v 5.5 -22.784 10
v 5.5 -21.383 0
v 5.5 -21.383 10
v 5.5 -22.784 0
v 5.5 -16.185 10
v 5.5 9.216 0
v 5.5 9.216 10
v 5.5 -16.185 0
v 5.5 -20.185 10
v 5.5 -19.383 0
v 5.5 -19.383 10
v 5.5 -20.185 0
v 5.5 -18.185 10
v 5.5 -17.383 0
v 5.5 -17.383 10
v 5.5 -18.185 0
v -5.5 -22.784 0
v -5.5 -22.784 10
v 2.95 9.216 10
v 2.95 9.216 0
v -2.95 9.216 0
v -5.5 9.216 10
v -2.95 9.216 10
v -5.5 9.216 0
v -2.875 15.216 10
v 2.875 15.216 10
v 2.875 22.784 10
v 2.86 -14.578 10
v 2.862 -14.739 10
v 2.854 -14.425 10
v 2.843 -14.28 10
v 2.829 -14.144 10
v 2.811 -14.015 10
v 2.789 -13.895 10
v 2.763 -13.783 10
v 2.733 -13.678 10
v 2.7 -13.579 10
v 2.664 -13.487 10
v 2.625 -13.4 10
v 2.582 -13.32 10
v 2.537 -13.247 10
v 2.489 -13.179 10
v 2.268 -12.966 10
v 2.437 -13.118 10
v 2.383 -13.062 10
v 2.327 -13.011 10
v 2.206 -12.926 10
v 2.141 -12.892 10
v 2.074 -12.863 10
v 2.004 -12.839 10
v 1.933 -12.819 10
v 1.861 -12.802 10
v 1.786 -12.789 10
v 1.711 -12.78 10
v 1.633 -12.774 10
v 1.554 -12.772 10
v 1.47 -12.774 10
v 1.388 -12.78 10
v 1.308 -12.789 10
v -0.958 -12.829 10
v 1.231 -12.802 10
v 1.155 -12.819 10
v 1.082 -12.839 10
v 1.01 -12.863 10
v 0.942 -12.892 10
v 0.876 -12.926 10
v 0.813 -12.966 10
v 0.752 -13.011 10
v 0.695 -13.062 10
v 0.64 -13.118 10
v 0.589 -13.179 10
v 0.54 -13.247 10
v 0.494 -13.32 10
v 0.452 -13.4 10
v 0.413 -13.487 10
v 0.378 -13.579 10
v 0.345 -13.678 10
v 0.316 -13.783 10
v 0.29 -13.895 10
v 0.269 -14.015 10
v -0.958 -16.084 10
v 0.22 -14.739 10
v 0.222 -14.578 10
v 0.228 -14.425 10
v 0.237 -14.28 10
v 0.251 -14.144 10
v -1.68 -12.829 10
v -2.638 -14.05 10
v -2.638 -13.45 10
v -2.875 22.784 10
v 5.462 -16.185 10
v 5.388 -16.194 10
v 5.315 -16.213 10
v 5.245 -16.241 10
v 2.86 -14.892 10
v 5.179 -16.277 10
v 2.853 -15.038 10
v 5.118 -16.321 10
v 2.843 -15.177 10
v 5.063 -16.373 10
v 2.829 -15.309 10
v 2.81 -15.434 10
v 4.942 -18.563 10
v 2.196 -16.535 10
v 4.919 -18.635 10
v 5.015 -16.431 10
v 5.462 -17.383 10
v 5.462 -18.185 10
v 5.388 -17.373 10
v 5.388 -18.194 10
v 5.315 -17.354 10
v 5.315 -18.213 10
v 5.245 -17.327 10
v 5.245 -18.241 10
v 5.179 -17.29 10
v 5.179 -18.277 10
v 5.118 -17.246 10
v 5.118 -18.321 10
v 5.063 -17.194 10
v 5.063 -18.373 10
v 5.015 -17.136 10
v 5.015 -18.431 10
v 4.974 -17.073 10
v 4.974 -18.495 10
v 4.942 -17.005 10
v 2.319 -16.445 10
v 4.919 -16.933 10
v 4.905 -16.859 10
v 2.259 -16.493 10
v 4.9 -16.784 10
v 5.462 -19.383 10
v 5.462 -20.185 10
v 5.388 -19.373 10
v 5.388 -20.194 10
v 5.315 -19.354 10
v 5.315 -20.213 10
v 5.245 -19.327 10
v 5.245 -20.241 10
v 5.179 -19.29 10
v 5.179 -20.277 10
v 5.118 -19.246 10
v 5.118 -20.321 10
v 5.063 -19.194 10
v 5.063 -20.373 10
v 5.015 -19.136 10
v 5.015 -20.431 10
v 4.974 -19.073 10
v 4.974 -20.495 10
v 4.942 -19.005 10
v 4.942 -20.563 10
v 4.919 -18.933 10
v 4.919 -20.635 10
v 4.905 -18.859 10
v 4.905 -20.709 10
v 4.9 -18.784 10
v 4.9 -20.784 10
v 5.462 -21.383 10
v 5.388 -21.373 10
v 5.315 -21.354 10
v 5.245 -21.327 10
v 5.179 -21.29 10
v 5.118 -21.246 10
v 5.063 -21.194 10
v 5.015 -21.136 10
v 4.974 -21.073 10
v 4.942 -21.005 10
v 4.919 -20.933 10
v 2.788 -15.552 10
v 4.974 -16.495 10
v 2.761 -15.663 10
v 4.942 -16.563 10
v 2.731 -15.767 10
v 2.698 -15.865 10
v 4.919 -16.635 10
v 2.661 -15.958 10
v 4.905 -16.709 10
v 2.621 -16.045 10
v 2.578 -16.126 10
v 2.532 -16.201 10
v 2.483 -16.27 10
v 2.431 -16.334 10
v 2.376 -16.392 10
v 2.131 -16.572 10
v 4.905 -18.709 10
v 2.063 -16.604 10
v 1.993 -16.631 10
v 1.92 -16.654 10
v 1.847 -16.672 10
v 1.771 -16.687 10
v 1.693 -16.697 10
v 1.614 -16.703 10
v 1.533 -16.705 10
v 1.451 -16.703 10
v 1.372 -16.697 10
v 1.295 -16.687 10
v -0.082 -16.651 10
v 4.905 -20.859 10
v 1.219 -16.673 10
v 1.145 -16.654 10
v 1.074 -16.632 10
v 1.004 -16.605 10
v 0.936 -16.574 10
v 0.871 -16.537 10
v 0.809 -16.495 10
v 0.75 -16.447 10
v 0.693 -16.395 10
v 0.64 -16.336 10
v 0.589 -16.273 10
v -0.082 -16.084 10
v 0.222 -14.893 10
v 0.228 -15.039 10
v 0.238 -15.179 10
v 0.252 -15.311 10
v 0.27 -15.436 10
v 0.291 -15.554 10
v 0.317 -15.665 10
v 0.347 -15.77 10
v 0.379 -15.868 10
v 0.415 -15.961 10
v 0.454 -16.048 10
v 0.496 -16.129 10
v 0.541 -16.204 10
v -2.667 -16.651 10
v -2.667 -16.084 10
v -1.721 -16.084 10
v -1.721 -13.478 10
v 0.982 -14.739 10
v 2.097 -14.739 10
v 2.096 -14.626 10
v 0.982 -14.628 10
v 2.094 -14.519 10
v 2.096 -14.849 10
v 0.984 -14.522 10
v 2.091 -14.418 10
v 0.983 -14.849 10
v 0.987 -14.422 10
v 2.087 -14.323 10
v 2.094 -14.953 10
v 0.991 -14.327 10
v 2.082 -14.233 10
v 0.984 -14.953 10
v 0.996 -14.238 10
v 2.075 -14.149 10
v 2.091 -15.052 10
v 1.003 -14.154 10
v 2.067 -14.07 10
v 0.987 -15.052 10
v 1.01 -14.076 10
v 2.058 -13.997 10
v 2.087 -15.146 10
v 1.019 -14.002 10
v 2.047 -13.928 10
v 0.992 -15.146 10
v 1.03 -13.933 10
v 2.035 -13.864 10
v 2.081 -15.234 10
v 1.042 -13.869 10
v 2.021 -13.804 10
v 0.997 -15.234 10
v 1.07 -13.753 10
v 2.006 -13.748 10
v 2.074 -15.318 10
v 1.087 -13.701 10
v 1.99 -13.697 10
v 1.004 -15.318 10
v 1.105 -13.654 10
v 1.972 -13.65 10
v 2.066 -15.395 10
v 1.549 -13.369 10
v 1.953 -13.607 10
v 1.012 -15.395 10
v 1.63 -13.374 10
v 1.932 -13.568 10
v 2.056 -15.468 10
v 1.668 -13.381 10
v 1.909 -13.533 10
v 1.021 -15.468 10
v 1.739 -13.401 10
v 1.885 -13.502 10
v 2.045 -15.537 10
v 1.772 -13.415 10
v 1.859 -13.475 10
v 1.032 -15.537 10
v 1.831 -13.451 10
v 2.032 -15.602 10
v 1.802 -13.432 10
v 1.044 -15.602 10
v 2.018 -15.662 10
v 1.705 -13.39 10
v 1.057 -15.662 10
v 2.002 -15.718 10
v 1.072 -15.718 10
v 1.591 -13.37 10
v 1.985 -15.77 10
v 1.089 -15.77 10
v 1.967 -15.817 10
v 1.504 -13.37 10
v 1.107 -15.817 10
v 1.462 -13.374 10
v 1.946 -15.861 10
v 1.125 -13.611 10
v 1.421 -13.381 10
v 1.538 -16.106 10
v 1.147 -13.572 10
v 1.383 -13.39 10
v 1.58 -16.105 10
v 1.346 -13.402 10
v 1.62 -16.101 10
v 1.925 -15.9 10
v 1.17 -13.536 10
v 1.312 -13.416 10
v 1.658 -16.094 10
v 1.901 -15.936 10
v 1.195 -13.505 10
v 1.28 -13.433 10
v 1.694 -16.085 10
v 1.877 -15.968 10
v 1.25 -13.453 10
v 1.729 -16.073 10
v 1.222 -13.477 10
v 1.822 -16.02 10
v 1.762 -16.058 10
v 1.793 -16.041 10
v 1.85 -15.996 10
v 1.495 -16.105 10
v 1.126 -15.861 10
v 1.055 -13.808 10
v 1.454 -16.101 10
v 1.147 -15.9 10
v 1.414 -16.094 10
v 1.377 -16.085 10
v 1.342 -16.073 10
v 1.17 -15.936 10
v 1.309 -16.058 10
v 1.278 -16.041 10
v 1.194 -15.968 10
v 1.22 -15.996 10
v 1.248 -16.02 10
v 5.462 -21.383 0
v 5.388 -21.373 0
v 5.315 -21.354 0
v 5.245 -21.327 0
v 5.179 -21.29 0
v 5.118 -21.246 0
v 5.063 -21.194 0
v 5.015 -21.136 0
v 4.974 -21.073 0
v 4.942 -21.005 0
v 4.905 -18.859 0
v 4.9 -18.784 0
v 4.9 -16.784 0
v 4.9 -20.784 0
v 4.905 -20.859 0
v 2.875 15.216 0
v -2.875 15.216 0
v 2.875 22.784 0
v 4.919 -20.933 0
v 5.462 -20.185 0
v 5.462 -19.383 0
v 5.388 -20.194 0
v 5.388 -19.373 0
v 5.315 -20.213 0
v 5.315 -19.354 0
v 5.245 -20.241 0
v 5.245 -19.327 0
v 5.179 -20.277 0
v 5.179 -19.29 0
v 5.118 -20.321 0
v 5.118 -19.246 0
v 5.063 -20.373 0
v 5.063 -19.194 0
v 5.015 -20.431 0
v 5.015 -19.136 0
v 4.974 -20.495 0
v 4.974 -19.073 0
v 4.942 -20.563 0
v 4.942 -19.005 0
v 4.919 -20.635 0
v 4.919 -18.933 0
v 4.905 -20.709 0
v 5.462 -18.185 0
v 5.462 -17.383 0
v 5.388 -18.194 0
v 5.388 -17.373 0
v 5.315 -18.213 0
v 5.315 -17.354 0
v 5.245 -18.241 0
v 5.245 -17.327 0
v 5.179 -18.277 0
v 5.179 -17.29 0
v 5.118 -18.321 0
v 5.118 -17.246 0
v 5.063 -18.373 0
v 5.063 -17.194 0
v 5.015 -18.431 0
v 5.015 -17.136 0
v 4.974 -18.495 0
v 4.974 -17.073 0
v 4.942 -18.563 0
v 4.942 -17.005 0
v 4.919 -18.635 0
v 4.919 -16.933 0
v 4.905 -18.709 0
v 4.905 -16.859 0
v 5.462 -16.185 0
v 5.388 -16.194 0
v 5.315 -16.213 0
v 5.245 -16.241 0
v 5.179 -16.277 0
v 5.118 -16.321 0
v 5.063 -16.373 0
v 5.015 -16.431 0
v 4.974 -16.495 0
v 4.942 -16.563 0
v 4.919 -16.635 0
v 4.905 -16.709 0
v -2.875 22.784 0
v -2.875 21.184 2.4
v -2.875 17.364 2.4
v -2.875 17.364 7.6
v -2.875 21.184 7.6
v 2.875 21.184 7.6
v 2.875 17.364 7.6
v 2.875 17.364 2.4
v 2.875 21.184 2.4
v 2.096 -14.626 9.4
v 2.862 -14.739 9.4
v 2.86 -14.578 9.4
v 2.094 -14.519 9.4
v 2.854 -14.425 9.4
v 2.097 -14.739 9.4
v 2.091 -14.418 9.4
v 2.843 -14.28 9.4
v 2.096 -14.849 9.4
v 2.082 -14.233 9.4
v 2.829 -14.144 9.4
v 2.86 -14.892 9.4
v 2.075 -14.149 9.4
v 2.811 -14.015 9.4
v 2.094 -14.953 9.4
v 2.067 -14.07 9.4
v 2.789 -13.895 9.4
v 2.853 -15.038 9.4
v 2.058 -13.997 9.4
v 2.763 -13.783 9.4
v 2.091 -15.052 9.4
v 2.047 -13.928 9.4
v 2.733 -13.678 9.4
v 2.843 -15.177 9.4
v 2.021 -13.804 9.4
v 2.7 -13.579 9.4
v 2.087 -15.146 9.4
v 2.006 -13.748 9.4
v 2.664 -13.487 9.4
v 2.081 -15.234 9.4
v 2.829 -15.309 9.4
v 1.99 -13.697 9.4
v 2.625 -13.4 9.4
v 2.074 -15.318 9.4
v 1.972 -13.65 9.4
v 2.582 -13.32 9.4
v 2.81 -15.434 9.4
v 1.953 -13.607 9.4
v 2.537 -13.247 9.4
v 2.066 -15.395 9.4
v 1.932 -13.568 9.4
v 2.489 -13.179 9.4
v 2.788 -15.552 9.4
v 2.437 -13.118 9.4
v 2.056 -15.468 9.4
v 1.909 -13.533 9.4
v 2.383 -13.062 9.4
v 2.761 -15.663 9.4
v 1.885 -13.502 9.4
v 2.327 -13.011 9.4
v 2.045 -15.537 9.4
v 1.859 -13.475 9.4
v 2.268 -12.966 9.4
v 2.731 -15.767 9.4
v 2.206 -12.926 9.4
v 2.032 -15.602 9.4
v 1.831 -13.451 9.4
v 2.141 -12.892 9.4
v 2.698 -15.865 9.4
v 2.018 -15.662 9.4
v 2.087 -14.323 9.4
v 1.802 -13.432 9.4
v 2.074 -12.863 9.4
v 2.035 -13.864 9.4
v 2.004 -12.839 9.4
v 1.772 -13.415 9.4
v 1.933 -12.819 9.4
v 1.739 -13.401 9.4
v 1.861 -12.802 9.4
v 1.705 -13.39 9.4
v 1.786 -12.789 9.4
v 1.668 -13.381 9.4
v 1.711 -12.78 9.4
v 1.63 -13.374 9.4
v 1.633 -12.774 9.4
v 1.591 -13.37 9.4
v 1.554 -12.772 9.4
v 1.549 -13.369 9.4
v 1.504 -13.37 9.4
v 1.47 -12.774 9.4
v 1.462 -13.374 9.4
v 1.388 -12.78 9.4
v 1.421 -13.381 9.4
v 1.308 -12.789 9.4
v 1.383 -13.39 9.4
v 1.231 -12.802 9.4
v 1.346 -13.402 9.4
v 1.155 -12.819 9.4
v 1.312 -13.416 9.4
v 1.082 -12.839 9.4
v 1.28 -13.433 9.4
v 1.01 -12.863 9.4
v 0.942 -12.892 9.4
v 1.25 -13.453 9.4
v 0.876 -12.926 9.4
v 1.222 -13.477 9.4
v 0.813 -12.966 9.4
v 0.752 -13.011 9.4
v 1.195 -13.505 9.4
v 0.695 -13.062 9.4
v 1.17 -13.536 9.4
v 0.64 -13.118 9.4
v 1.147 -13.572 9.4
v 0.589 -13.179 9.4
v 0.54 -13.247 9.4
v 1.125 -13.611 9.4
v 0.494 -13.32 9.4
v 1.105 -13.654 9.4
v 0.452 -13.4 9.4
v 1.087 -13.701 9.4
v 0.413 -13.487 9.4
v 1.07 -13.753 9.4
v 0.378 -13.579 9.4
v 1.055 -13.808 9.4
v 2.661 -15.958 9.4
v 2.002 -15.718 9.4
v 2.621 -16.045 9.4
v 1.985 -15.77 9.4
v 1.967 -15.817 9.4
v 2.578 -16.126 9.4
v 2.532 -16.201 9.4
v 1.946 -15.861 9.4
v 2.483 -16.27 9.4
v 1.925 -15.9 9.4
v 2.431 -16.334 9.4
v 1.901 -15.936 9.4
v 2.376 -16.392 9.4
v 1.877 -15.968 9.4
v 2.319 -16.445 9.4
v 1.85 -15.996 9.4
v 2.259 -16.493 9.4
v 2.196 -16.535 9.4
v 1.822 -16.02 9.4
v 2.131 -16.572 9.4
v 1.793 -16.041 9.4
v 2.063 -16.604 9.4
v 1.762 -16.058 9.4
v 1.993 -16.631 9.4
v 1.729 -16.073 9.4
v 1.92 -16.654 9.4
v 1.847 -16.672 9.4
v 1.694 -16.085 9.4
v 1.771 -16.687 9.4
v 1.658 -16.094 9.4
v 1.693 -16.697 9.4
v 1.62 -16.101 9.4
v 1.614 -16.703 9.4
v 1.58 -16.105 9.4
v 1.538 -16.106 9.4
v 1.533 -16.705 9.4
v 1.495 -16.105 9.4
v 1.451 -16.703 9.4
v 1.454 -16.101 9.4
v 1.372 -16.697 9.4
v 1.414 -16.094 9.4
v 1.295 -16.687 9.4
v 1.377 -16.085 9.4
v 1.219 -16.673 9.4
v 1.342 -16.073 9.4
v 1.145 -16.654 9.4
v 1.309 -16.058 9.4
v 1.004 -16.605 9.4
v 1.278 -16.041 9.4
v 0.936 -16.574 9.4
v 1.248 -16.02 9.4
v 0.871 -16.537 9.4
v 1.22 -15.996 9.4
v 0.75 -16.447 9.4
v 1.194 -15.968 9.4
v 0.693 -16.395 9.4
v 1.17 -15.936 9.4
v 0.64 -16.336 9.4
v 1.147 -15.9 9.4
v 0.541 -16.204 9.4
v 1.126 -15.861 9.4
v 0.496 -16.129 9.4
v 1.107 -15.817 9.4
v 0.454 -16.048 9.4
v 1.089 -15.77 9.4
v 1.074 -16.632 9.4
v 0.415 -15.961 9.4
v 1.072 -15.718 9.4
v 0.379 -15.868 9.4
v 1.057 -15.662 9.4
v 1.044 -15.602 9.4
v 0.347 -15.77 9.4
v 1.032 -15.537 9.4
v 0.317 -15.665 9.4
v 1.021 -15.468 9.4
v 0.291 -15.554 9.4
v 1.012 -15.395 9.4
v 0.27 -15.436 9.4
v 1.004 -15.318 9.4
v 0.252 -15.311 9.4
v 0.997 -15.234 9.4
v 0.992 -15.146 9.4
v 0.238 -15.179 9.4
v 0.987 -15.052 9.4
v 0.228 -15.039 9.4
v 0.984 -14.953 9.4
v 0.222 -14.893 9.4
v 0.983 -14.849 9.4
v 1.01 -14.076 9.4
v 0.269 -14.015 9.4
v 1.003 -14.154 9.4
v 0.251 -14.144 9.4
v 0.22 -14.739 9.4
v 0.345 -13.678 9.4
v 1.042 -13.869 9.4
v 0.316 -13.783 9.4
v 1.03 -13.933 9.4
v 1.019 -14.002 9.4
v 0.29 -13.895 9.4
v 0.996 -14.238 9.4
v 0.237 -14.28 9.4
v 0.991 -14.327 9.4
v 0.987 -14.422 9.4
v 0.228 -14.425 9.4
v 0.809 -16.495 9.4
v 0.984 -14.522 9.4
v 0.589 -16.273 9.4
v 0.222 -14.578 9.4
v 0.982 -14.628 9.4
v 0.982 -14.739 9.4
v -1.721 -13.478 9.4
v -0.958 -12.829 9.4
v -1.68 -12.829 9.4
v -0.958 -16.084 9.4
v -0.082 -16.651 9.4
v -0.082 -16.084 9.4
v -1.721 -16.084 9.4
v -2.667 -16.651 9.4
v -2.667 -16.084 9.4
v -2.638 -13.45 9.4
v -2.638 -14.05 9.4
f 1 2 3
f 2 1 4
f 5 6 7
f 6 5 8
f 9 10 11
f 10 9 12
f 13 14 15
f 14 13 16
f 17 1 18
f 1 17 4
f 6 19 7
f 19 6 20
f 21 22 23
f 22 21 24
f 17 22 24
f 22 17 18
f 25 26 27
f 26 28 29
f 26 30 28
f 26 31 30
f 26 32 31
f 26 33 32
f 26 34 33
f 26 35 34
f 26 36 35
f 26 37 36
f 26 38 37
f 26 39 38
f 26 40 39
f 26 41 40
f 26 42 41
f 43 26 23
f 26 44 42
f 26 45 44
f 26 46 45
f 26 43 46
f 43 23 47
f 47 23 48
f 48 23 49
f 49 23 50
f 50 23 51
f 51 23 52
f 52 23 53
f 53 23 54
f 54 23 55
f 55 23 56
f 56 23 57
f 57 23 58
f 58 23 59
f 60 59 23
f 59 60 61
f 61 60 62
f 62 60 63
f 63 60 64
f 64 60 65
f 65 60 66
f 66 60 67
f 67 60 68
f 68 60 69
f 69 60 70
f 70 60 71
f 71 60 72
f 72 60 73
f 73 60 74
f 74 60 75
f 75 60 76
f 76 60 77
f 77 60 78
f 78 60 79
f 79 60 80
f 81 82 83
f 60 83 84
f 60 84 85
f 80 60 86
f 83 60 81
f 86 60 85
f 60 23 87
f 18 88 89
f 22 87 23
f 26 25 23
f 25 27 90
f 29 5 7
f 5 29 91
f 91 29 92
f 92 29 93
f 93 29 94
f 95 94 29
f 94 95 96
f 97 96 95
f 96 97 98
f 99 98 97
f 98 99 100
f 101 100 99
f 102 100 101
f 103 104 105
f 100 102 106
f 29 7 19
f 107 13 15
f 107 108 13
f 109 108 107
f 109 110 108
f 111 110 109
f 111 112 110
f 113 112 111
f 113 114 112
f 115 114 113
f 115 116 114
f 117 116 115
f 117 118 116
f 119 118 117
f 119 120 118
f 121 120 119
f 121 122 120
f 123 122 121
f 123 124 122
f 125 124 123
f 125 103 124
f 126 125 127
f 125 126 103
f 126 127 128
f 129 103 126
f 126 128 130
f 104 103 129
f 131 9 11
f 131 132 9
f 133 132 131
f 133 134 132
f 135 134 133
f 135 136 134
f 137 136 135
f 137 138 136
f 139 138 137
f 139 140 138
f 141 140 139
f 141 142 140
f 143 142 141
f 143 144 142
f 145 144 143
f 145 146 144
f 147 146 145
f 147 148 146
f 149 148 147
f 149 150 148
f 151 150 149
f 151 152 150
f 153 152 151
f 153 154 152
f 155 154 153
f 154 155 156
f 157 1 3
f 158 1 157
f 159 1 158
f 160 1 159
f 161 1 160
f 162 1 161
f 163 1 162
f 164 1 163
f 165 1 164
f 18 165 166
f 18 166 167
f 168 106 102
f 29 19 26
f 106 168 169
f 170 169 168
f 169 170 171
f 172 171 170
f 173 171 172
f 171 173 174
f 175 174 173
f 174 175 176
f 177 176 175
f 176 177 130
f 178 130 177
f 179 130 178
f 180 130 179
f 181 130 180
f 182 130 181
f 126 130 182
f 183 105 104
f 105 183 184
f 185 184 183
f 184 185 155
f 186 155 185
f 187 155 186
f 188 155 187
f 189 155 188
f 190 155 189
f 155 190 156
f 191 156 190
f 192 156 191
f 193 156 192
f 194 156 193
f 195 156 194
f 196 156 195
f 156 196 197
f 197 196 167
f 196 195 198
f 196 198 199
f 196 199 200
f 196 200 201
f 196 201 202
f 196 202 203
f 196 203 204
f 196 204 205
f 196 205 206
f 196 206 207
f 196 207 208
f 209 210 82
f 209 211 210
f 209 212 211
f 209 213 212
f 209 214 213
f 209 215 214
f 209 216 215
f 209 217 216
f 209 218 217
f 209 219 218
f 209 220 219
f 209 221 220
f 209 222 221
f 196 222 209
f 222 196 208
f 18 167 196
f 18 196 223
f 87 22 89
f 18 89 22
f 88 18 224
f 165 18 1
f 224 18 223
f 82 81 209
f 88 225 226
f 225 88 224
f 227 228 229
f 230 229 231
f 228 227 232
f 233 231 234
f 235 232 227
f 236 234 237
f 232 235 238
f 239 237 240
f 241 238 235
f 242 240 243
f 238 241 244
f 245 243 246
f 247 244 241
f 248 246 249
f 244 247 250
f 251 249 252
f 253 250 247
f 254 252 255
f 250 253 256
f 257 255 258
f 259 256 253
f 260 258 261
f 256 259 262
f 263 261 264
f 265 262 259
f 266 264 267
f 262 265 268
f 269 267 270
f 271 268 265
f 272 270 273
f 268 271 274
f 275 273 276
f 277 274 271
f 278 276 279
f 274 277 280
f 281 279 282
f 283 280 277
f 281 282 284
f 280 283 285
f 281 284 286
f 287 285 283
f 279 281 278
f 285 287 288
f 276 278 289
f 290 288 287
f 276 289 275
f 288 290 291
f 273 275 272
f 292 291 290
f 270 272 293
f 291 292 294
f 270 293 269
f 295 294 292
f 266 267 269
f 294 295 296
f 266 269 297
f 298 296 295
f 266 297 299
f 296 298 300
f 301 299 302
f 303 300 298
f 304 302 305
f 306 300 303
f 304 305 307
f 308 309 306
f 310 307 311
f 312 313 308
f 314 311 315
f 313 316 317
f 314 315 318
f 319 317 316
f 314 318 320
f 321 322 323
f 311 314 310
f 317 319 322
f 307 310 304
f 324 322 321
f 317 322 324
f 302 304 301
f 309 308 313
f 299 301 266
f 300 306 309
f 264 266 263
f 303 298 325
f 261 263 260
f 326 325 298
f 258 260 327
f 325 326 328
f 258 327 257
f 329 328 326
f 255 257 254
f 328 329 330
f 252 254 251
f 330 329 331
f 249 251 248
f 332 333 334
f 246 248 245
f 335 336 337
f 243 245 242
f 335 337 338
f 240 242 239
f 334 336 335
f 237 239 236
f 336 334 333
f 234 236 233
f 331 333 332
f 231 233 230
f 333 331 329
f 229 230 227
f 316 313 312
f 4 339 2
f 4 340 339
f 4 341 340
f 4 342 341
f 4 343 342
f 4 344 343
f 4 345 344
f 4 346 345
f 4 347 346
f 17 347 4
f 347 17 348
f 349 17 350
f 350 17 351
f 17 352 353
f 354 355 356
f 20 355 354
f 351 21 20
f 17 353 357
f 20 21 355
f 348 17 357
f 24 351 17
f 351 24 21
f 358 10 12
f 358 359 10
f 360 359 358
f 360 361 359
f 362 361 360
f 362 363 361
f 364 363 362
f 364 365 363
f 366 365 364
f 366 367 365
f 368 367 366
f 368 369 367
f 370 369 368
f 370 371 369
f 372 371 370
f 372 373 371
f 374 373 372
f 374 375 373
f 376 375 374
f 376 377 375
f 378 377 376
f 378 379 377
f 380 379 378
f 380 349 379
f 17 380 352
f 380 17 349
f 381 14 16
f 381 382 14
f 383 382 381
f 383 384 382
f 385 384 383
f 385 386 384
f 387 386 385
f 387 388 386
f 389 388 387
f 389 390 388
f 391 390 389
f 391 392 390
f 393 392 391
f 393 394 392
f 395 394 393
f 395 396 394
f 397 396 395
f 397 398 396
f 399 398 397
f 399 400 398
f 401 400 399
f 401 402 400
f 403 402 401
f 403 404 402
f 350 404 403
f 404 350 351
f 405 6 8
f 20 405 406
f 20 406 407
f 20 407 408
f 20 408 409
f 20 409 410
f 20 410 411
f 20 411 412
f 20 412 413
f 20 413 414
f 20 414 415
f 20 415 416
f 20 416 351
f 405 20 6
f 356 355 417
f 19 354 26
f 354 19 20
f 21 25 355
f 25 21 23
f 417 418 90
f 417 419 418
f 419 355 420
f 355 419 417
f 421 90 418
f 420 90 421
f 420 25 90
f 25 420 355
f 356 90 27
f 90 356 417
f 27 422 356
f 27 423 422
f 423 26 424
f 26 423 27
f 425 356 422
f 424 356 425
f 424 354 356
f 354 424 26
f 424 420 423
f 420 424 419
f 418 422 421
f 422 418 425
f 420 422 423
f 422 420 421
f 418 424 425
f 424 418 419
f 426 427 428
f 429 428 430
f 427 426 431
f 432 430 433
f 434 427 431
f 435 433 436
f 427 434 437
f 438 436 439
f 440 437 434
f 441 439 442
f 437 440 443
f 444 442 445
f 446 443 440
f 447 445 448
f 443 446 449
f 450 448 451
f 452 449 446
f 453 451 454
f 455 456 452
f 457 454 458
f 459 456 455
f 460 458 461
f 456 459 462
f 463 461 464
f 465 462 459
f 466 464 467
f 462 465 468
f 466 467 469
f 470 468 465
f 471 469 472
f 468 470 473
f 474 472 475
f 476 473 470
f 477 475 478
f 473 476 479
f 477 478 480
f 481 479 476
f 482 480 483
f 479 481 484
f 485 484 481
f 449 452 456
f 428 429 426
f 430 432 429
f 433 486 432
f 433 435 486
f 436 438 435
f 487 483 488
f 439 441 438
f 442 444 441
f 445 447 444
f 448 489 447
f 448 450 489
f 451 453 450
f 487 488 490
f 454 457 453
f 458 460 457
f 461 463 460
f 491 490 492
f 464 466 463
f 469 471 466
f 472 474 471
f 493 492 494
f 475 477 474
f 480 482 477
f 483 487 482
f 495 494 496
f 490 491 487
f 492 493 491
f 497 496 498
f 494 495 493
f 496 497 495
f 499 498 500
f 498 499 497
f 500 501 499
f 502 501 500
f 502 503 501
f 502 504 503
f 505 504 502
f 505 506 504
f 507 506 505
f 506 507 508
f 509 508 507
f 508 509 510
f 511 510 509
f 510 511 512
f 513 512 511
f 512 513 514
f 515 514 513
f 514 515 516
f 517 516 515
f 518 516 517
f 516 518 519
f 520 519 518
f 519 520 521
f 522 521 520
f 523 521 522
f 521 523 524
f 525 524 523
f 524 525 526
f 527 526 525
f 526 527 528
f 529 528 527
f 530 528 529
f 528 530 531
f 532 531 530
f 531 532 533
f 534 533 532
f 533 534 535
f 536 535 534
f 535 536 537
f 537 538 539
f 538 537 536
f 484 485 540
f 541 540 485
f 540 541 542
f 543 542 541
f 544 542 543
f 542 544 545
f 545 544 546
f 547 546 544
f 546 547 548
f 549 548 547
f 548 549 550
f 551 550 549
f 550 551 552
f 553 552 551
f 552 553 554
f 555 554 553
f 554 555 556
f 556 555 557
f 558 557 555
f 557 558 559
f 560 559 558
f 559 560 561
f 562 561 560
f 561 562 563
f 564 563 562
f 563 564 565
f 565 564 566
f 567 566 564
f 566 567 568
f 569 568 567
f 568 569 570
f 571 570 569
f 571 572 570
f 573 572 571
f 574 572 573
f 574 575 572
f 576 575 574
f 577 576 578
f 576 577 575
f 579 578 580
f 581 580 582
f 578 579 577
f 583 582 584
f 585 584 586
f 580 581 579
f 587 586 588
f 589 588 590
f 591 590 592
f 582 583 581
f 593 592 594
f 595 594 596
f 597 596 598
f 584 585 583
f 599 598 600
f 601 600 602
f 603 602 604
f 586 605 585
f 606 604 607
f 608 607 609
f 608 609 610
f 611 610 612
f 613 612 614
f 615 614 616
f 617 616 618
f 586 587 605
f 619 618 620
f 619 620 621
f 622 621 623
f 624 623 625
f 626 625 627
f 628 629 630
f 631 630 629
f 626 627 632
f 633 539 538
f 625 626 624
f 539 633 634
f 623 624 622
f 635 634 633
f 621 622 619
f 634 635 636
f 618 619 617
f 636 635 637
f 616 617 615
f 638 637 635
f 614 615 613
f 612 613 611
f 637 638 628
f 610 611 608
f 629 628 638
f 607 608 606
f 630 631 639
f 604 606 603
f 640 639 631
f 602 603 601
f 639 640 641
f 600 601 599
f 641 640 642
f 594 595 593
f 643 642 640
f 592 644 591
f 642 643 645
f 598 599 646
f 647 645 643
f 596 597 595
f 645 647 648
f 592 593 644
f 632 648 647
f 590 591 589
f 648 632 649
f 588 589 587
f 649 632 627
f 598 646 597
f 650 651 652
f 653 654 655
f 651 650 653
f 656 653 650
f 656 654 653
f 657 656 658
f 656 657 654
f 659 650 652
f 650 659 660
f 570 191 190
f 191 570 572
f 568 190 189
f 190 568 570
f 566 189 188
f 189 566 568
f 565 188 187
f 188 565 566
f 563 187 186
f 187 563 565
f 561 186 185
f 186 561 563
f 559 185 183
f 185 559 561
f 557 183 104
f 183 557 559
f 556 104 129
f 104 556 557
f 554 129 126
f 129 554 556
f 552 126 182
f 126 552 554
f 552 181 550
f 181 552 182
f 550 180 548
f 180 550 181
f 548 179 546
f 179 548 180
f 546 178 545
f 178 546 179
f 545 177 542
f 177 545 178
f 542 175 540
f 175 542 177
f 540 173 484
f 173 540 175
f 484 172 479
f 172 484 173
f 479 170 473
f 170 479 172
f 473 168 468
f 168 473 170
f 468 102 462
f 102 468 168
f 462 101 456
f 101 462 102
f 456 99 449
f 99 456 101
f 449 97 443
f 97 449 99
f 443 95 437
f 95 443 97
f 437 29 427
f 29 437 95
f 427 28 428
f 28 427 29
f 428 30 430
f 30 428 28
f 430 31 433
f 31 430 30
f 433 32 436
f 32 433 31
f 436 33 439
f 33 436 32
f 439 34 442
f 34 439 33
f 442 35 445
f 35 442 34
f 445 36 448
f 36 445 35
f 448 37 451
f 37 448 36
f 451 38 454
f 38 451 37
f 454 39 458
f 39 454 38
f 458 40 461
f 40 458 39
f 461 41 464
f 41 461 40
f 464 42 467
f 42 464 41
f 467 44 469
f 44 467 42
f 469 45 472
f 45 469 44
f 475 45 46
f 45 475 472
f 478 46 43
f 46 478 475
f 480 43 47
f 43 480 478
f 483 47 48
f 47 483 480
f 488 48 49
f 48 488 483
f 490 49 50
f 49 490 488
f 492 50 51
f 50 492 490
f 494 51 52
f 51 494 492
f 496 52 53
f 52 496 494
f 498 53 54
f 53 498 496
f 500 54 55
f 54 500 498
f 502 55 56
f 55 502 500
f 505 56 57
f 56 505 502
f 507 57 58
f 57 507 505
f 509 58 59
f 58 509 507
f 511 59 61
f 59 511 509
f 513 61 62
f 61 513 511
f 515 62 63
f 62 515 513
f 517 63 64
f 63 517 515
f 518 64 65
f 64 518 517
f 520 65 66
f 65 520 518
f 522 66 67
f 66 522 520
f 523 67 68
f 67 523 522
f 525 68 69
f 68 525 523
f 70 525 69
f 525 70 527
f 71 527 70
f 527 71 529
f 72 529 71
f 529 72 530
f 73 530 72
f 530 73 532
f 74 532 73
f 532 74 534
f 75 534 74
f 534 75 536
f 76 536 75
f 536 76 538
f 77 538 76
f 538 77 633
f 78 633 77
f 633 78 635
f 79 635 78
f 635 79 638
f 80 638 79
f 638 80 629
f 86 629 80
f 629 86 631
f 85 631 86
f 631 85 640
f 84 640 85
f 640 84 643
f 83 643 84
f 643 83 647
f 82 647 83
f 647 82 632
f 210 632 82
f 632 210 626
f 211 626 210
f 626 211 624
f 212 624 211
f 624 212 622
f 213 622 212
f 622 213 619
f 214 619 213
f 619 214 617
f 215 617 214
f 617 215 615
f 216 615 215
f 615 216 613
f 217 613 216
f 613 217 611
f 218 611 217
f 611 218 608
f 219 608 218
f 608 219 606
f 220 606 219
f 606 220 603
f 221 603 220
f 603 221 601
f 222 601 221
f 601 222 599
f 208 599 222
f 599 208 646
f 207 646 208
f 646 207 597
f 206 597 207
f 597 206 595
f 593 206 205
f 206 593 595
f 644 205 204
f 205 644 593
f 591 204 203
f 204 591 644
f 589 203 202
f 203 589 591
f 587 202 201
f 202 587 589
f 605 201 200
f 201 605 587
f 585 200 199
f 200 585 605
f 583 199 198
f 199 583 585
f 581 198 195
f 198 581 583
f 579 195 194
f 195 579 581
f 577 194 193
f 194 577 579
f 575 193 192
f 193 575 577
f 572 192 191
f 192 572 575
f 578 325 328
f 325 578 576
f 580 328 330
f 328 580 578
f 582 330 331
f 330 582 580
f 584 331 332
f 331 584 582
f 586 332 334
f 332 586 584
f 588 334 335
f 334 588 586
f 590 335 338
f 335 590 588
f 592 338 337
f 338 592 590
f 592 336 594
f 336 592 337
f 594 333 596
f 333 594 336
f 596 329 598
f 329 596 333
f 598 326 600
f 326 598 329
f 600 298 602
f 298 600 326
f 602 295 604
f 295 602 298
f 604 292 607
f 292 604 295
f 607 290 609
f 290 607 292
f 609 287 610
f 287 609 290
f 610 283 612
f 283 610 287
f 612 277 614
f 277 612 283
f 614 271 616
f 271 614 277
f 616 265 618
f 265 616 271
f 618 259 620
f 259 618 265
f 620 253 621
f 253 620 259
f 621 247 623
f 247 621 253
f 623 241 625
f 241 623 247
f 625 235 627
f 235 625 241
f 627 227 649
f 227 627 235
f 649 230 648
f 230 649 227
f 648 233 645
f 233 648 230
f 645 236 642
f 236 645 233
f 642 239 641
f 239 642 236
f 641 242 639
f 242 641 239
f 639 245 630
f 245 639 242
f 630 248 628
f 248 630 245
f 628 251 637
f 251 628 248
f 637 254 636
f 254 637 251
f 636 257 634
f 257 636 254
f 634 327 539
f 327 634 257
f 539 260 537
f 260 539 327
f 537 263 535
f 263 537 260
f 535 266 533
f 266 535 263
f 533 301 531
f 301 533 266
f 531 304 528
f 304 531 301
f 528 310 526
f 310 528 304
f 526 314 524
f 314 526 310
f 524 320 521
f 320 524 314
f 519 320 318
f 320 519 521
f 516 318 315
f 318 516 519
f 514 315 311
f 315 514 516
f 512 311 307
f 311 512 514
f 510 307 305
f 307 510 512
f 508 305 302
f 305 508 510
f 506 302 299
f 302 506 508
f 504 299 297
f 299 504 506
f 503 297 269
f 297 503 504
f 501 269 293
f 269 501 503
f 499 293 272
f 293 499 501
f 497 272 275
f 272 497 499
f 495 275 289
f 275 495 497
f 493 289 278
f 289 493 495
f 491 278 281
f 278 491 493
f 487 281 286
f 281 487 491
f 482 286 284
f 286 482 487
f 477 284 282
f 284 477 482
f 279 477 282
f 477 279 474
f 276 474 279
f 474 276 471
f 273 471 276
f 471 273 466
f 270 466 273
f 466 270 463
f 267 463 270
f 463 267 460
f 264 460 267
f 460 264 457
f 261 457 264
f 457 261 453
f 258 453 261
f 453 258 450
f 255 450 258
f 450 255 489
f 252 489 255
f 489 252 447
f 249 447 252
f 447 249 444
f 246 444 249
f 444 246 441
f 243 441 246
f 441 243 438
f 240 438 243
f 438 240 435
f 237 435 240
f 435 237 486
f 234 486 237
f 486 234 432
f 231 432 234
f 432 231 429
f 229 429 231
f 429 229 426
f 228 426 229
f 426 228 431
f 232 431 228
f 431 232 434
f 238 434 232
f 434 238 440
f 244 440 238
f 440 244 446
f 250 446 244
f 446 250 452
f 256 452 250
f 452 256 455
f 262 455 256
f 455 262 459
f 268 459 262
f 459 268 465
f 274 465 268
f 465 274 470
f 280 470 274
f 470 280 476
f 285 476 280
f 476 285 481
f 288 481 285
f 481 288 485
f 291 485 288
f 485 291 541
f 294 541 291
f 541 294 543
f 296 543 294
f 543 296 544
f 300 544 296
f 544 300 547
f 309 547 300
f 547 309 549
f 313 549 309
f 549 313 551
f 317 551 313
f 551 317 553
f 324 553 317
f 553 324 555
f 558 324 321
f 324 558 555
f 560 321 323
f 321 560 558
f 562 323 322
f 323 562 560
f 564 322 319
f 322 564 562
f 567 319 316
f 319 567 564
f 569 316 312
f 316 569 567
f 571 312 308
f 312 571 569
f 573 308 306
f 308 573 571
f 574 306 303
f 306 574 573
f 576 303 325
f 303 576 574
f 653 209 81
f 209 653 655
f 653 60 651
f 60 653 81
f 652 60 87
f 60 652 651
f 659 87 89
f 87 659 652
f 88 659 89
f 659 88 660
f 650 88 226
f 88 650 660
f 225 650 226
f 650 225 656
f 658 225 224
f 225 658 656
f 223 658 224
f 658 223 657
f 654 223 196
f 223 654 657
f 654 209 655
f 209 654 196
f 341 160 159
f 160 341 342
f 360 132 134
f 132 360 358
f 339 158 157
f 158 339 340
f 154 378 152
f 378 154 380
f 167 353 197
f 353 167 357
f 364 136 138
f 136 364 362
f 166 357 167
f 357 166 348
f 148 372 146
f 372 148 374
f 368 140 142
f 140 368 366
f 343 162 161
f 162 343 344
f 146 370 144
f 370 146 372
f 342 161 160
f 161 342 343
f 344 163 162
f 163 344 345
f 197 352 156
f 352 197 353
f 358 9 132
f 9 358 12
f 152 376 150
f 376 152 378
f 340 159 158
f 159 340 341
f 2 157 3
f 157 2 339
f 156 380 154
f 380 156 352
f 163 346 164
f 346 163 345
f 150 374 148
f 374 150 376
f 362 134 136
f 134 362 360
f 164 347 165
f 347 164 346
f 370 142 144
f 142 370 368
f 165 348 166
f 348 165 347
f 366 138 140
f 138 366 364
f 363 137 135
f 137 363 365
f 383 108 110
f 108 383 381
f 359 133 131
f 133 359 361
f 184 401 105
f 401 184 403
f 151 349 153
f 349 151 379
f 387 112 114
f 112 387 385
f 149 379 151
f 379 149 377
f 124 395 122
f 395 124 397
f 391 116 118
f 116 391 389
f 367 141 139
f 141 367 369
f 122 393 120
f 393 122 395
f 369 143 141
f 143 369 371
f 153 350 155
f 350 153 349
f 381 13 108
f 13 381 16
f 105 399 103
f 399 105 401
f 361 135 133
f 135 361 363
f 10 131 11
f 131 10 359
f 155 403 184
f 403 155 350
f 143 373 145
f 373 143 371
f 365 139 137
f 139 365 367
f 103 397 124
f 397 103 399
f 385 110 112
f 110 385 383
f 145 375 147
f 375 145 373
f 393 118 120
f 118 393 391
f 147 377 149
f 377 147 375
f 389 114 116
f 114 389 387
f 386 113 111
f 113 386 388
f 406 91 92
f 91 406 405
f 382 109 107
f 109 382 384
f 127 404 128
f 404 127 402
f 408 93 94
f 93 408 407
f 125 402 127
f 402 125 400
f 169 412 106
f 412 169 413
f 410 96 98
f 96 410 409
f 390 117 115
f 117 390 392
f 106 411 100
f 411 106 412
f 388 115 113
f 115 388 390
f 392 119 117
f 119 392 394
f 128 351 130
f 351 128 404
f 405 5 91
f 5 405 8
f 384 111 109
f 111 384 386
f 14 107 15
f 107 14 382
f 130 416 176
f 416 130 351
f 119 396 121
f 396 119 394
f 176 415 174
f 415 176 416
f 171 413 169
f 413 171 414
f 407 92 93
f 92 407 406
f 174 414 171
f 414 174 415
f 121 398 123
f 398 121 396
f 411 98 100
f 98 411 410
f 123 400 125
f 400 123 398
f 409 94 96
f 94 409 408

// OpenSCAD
$fn = 50;

difference() {
	union() {
		translate(v = [0, 9.21625, 0]) {
			rotate(a = [90, 0, 0]) {
				difference() {
					union() {
						translate(v = [-5.5, 0, 0]) {
							cube(size = [11.0, 10.0, 32.0]);
						}
						translate(v = [0, 10.0, 0]) {
							rotate(a = [90, 0, 0]) {
								linear_extrude(height = 10.0) {
									polygon(points = [[-2.875, -13.5675], [2.875, -13.5675], [2.875, -6.0], [2.95, 0], [2.95, 0.1], [-2.95, 0.1], [-2.95, 0], [-2.875, -6.0]]);
								}
							}
						}
					}
					union() {
						translate(v = [-2.975, 2.4000000000000004, -11.9675]) {
							cube(size = [5.95, 5.199999999999999, 3.8200000000000003]);
						}
						translate(v = [0, 9.4, 24.0]) {
							rotate(a = [-90, 0, 0]) {
								linear_extrude(height = 0.7) {
									text(font = "Arial:style=Bold", halign = "center", size = 4.0, text = "10", valign = "center");
								}
							}
						}
						translate(v = [5.5, 10.1, 30.0]) {
							rotate(a = [90, 0, 0]) {
								cylinder(h = 10.2, r = 0.6);
							}
						}
						translate(v = [5.5, 10.1, 28.0]) {
							rotate(a = [90, 0, 0]) {
								cylinder(h = 10.2, r = 0.6);
							}
						}
						translate(v = [5.5, 10.1, 26.0]) {
							rotate(a = [90, 0, 0]) {
								cylinder(h = 10.2, r = 0.6);
							}
						}
					}
				}
			}
		}
	}
	union();
}
